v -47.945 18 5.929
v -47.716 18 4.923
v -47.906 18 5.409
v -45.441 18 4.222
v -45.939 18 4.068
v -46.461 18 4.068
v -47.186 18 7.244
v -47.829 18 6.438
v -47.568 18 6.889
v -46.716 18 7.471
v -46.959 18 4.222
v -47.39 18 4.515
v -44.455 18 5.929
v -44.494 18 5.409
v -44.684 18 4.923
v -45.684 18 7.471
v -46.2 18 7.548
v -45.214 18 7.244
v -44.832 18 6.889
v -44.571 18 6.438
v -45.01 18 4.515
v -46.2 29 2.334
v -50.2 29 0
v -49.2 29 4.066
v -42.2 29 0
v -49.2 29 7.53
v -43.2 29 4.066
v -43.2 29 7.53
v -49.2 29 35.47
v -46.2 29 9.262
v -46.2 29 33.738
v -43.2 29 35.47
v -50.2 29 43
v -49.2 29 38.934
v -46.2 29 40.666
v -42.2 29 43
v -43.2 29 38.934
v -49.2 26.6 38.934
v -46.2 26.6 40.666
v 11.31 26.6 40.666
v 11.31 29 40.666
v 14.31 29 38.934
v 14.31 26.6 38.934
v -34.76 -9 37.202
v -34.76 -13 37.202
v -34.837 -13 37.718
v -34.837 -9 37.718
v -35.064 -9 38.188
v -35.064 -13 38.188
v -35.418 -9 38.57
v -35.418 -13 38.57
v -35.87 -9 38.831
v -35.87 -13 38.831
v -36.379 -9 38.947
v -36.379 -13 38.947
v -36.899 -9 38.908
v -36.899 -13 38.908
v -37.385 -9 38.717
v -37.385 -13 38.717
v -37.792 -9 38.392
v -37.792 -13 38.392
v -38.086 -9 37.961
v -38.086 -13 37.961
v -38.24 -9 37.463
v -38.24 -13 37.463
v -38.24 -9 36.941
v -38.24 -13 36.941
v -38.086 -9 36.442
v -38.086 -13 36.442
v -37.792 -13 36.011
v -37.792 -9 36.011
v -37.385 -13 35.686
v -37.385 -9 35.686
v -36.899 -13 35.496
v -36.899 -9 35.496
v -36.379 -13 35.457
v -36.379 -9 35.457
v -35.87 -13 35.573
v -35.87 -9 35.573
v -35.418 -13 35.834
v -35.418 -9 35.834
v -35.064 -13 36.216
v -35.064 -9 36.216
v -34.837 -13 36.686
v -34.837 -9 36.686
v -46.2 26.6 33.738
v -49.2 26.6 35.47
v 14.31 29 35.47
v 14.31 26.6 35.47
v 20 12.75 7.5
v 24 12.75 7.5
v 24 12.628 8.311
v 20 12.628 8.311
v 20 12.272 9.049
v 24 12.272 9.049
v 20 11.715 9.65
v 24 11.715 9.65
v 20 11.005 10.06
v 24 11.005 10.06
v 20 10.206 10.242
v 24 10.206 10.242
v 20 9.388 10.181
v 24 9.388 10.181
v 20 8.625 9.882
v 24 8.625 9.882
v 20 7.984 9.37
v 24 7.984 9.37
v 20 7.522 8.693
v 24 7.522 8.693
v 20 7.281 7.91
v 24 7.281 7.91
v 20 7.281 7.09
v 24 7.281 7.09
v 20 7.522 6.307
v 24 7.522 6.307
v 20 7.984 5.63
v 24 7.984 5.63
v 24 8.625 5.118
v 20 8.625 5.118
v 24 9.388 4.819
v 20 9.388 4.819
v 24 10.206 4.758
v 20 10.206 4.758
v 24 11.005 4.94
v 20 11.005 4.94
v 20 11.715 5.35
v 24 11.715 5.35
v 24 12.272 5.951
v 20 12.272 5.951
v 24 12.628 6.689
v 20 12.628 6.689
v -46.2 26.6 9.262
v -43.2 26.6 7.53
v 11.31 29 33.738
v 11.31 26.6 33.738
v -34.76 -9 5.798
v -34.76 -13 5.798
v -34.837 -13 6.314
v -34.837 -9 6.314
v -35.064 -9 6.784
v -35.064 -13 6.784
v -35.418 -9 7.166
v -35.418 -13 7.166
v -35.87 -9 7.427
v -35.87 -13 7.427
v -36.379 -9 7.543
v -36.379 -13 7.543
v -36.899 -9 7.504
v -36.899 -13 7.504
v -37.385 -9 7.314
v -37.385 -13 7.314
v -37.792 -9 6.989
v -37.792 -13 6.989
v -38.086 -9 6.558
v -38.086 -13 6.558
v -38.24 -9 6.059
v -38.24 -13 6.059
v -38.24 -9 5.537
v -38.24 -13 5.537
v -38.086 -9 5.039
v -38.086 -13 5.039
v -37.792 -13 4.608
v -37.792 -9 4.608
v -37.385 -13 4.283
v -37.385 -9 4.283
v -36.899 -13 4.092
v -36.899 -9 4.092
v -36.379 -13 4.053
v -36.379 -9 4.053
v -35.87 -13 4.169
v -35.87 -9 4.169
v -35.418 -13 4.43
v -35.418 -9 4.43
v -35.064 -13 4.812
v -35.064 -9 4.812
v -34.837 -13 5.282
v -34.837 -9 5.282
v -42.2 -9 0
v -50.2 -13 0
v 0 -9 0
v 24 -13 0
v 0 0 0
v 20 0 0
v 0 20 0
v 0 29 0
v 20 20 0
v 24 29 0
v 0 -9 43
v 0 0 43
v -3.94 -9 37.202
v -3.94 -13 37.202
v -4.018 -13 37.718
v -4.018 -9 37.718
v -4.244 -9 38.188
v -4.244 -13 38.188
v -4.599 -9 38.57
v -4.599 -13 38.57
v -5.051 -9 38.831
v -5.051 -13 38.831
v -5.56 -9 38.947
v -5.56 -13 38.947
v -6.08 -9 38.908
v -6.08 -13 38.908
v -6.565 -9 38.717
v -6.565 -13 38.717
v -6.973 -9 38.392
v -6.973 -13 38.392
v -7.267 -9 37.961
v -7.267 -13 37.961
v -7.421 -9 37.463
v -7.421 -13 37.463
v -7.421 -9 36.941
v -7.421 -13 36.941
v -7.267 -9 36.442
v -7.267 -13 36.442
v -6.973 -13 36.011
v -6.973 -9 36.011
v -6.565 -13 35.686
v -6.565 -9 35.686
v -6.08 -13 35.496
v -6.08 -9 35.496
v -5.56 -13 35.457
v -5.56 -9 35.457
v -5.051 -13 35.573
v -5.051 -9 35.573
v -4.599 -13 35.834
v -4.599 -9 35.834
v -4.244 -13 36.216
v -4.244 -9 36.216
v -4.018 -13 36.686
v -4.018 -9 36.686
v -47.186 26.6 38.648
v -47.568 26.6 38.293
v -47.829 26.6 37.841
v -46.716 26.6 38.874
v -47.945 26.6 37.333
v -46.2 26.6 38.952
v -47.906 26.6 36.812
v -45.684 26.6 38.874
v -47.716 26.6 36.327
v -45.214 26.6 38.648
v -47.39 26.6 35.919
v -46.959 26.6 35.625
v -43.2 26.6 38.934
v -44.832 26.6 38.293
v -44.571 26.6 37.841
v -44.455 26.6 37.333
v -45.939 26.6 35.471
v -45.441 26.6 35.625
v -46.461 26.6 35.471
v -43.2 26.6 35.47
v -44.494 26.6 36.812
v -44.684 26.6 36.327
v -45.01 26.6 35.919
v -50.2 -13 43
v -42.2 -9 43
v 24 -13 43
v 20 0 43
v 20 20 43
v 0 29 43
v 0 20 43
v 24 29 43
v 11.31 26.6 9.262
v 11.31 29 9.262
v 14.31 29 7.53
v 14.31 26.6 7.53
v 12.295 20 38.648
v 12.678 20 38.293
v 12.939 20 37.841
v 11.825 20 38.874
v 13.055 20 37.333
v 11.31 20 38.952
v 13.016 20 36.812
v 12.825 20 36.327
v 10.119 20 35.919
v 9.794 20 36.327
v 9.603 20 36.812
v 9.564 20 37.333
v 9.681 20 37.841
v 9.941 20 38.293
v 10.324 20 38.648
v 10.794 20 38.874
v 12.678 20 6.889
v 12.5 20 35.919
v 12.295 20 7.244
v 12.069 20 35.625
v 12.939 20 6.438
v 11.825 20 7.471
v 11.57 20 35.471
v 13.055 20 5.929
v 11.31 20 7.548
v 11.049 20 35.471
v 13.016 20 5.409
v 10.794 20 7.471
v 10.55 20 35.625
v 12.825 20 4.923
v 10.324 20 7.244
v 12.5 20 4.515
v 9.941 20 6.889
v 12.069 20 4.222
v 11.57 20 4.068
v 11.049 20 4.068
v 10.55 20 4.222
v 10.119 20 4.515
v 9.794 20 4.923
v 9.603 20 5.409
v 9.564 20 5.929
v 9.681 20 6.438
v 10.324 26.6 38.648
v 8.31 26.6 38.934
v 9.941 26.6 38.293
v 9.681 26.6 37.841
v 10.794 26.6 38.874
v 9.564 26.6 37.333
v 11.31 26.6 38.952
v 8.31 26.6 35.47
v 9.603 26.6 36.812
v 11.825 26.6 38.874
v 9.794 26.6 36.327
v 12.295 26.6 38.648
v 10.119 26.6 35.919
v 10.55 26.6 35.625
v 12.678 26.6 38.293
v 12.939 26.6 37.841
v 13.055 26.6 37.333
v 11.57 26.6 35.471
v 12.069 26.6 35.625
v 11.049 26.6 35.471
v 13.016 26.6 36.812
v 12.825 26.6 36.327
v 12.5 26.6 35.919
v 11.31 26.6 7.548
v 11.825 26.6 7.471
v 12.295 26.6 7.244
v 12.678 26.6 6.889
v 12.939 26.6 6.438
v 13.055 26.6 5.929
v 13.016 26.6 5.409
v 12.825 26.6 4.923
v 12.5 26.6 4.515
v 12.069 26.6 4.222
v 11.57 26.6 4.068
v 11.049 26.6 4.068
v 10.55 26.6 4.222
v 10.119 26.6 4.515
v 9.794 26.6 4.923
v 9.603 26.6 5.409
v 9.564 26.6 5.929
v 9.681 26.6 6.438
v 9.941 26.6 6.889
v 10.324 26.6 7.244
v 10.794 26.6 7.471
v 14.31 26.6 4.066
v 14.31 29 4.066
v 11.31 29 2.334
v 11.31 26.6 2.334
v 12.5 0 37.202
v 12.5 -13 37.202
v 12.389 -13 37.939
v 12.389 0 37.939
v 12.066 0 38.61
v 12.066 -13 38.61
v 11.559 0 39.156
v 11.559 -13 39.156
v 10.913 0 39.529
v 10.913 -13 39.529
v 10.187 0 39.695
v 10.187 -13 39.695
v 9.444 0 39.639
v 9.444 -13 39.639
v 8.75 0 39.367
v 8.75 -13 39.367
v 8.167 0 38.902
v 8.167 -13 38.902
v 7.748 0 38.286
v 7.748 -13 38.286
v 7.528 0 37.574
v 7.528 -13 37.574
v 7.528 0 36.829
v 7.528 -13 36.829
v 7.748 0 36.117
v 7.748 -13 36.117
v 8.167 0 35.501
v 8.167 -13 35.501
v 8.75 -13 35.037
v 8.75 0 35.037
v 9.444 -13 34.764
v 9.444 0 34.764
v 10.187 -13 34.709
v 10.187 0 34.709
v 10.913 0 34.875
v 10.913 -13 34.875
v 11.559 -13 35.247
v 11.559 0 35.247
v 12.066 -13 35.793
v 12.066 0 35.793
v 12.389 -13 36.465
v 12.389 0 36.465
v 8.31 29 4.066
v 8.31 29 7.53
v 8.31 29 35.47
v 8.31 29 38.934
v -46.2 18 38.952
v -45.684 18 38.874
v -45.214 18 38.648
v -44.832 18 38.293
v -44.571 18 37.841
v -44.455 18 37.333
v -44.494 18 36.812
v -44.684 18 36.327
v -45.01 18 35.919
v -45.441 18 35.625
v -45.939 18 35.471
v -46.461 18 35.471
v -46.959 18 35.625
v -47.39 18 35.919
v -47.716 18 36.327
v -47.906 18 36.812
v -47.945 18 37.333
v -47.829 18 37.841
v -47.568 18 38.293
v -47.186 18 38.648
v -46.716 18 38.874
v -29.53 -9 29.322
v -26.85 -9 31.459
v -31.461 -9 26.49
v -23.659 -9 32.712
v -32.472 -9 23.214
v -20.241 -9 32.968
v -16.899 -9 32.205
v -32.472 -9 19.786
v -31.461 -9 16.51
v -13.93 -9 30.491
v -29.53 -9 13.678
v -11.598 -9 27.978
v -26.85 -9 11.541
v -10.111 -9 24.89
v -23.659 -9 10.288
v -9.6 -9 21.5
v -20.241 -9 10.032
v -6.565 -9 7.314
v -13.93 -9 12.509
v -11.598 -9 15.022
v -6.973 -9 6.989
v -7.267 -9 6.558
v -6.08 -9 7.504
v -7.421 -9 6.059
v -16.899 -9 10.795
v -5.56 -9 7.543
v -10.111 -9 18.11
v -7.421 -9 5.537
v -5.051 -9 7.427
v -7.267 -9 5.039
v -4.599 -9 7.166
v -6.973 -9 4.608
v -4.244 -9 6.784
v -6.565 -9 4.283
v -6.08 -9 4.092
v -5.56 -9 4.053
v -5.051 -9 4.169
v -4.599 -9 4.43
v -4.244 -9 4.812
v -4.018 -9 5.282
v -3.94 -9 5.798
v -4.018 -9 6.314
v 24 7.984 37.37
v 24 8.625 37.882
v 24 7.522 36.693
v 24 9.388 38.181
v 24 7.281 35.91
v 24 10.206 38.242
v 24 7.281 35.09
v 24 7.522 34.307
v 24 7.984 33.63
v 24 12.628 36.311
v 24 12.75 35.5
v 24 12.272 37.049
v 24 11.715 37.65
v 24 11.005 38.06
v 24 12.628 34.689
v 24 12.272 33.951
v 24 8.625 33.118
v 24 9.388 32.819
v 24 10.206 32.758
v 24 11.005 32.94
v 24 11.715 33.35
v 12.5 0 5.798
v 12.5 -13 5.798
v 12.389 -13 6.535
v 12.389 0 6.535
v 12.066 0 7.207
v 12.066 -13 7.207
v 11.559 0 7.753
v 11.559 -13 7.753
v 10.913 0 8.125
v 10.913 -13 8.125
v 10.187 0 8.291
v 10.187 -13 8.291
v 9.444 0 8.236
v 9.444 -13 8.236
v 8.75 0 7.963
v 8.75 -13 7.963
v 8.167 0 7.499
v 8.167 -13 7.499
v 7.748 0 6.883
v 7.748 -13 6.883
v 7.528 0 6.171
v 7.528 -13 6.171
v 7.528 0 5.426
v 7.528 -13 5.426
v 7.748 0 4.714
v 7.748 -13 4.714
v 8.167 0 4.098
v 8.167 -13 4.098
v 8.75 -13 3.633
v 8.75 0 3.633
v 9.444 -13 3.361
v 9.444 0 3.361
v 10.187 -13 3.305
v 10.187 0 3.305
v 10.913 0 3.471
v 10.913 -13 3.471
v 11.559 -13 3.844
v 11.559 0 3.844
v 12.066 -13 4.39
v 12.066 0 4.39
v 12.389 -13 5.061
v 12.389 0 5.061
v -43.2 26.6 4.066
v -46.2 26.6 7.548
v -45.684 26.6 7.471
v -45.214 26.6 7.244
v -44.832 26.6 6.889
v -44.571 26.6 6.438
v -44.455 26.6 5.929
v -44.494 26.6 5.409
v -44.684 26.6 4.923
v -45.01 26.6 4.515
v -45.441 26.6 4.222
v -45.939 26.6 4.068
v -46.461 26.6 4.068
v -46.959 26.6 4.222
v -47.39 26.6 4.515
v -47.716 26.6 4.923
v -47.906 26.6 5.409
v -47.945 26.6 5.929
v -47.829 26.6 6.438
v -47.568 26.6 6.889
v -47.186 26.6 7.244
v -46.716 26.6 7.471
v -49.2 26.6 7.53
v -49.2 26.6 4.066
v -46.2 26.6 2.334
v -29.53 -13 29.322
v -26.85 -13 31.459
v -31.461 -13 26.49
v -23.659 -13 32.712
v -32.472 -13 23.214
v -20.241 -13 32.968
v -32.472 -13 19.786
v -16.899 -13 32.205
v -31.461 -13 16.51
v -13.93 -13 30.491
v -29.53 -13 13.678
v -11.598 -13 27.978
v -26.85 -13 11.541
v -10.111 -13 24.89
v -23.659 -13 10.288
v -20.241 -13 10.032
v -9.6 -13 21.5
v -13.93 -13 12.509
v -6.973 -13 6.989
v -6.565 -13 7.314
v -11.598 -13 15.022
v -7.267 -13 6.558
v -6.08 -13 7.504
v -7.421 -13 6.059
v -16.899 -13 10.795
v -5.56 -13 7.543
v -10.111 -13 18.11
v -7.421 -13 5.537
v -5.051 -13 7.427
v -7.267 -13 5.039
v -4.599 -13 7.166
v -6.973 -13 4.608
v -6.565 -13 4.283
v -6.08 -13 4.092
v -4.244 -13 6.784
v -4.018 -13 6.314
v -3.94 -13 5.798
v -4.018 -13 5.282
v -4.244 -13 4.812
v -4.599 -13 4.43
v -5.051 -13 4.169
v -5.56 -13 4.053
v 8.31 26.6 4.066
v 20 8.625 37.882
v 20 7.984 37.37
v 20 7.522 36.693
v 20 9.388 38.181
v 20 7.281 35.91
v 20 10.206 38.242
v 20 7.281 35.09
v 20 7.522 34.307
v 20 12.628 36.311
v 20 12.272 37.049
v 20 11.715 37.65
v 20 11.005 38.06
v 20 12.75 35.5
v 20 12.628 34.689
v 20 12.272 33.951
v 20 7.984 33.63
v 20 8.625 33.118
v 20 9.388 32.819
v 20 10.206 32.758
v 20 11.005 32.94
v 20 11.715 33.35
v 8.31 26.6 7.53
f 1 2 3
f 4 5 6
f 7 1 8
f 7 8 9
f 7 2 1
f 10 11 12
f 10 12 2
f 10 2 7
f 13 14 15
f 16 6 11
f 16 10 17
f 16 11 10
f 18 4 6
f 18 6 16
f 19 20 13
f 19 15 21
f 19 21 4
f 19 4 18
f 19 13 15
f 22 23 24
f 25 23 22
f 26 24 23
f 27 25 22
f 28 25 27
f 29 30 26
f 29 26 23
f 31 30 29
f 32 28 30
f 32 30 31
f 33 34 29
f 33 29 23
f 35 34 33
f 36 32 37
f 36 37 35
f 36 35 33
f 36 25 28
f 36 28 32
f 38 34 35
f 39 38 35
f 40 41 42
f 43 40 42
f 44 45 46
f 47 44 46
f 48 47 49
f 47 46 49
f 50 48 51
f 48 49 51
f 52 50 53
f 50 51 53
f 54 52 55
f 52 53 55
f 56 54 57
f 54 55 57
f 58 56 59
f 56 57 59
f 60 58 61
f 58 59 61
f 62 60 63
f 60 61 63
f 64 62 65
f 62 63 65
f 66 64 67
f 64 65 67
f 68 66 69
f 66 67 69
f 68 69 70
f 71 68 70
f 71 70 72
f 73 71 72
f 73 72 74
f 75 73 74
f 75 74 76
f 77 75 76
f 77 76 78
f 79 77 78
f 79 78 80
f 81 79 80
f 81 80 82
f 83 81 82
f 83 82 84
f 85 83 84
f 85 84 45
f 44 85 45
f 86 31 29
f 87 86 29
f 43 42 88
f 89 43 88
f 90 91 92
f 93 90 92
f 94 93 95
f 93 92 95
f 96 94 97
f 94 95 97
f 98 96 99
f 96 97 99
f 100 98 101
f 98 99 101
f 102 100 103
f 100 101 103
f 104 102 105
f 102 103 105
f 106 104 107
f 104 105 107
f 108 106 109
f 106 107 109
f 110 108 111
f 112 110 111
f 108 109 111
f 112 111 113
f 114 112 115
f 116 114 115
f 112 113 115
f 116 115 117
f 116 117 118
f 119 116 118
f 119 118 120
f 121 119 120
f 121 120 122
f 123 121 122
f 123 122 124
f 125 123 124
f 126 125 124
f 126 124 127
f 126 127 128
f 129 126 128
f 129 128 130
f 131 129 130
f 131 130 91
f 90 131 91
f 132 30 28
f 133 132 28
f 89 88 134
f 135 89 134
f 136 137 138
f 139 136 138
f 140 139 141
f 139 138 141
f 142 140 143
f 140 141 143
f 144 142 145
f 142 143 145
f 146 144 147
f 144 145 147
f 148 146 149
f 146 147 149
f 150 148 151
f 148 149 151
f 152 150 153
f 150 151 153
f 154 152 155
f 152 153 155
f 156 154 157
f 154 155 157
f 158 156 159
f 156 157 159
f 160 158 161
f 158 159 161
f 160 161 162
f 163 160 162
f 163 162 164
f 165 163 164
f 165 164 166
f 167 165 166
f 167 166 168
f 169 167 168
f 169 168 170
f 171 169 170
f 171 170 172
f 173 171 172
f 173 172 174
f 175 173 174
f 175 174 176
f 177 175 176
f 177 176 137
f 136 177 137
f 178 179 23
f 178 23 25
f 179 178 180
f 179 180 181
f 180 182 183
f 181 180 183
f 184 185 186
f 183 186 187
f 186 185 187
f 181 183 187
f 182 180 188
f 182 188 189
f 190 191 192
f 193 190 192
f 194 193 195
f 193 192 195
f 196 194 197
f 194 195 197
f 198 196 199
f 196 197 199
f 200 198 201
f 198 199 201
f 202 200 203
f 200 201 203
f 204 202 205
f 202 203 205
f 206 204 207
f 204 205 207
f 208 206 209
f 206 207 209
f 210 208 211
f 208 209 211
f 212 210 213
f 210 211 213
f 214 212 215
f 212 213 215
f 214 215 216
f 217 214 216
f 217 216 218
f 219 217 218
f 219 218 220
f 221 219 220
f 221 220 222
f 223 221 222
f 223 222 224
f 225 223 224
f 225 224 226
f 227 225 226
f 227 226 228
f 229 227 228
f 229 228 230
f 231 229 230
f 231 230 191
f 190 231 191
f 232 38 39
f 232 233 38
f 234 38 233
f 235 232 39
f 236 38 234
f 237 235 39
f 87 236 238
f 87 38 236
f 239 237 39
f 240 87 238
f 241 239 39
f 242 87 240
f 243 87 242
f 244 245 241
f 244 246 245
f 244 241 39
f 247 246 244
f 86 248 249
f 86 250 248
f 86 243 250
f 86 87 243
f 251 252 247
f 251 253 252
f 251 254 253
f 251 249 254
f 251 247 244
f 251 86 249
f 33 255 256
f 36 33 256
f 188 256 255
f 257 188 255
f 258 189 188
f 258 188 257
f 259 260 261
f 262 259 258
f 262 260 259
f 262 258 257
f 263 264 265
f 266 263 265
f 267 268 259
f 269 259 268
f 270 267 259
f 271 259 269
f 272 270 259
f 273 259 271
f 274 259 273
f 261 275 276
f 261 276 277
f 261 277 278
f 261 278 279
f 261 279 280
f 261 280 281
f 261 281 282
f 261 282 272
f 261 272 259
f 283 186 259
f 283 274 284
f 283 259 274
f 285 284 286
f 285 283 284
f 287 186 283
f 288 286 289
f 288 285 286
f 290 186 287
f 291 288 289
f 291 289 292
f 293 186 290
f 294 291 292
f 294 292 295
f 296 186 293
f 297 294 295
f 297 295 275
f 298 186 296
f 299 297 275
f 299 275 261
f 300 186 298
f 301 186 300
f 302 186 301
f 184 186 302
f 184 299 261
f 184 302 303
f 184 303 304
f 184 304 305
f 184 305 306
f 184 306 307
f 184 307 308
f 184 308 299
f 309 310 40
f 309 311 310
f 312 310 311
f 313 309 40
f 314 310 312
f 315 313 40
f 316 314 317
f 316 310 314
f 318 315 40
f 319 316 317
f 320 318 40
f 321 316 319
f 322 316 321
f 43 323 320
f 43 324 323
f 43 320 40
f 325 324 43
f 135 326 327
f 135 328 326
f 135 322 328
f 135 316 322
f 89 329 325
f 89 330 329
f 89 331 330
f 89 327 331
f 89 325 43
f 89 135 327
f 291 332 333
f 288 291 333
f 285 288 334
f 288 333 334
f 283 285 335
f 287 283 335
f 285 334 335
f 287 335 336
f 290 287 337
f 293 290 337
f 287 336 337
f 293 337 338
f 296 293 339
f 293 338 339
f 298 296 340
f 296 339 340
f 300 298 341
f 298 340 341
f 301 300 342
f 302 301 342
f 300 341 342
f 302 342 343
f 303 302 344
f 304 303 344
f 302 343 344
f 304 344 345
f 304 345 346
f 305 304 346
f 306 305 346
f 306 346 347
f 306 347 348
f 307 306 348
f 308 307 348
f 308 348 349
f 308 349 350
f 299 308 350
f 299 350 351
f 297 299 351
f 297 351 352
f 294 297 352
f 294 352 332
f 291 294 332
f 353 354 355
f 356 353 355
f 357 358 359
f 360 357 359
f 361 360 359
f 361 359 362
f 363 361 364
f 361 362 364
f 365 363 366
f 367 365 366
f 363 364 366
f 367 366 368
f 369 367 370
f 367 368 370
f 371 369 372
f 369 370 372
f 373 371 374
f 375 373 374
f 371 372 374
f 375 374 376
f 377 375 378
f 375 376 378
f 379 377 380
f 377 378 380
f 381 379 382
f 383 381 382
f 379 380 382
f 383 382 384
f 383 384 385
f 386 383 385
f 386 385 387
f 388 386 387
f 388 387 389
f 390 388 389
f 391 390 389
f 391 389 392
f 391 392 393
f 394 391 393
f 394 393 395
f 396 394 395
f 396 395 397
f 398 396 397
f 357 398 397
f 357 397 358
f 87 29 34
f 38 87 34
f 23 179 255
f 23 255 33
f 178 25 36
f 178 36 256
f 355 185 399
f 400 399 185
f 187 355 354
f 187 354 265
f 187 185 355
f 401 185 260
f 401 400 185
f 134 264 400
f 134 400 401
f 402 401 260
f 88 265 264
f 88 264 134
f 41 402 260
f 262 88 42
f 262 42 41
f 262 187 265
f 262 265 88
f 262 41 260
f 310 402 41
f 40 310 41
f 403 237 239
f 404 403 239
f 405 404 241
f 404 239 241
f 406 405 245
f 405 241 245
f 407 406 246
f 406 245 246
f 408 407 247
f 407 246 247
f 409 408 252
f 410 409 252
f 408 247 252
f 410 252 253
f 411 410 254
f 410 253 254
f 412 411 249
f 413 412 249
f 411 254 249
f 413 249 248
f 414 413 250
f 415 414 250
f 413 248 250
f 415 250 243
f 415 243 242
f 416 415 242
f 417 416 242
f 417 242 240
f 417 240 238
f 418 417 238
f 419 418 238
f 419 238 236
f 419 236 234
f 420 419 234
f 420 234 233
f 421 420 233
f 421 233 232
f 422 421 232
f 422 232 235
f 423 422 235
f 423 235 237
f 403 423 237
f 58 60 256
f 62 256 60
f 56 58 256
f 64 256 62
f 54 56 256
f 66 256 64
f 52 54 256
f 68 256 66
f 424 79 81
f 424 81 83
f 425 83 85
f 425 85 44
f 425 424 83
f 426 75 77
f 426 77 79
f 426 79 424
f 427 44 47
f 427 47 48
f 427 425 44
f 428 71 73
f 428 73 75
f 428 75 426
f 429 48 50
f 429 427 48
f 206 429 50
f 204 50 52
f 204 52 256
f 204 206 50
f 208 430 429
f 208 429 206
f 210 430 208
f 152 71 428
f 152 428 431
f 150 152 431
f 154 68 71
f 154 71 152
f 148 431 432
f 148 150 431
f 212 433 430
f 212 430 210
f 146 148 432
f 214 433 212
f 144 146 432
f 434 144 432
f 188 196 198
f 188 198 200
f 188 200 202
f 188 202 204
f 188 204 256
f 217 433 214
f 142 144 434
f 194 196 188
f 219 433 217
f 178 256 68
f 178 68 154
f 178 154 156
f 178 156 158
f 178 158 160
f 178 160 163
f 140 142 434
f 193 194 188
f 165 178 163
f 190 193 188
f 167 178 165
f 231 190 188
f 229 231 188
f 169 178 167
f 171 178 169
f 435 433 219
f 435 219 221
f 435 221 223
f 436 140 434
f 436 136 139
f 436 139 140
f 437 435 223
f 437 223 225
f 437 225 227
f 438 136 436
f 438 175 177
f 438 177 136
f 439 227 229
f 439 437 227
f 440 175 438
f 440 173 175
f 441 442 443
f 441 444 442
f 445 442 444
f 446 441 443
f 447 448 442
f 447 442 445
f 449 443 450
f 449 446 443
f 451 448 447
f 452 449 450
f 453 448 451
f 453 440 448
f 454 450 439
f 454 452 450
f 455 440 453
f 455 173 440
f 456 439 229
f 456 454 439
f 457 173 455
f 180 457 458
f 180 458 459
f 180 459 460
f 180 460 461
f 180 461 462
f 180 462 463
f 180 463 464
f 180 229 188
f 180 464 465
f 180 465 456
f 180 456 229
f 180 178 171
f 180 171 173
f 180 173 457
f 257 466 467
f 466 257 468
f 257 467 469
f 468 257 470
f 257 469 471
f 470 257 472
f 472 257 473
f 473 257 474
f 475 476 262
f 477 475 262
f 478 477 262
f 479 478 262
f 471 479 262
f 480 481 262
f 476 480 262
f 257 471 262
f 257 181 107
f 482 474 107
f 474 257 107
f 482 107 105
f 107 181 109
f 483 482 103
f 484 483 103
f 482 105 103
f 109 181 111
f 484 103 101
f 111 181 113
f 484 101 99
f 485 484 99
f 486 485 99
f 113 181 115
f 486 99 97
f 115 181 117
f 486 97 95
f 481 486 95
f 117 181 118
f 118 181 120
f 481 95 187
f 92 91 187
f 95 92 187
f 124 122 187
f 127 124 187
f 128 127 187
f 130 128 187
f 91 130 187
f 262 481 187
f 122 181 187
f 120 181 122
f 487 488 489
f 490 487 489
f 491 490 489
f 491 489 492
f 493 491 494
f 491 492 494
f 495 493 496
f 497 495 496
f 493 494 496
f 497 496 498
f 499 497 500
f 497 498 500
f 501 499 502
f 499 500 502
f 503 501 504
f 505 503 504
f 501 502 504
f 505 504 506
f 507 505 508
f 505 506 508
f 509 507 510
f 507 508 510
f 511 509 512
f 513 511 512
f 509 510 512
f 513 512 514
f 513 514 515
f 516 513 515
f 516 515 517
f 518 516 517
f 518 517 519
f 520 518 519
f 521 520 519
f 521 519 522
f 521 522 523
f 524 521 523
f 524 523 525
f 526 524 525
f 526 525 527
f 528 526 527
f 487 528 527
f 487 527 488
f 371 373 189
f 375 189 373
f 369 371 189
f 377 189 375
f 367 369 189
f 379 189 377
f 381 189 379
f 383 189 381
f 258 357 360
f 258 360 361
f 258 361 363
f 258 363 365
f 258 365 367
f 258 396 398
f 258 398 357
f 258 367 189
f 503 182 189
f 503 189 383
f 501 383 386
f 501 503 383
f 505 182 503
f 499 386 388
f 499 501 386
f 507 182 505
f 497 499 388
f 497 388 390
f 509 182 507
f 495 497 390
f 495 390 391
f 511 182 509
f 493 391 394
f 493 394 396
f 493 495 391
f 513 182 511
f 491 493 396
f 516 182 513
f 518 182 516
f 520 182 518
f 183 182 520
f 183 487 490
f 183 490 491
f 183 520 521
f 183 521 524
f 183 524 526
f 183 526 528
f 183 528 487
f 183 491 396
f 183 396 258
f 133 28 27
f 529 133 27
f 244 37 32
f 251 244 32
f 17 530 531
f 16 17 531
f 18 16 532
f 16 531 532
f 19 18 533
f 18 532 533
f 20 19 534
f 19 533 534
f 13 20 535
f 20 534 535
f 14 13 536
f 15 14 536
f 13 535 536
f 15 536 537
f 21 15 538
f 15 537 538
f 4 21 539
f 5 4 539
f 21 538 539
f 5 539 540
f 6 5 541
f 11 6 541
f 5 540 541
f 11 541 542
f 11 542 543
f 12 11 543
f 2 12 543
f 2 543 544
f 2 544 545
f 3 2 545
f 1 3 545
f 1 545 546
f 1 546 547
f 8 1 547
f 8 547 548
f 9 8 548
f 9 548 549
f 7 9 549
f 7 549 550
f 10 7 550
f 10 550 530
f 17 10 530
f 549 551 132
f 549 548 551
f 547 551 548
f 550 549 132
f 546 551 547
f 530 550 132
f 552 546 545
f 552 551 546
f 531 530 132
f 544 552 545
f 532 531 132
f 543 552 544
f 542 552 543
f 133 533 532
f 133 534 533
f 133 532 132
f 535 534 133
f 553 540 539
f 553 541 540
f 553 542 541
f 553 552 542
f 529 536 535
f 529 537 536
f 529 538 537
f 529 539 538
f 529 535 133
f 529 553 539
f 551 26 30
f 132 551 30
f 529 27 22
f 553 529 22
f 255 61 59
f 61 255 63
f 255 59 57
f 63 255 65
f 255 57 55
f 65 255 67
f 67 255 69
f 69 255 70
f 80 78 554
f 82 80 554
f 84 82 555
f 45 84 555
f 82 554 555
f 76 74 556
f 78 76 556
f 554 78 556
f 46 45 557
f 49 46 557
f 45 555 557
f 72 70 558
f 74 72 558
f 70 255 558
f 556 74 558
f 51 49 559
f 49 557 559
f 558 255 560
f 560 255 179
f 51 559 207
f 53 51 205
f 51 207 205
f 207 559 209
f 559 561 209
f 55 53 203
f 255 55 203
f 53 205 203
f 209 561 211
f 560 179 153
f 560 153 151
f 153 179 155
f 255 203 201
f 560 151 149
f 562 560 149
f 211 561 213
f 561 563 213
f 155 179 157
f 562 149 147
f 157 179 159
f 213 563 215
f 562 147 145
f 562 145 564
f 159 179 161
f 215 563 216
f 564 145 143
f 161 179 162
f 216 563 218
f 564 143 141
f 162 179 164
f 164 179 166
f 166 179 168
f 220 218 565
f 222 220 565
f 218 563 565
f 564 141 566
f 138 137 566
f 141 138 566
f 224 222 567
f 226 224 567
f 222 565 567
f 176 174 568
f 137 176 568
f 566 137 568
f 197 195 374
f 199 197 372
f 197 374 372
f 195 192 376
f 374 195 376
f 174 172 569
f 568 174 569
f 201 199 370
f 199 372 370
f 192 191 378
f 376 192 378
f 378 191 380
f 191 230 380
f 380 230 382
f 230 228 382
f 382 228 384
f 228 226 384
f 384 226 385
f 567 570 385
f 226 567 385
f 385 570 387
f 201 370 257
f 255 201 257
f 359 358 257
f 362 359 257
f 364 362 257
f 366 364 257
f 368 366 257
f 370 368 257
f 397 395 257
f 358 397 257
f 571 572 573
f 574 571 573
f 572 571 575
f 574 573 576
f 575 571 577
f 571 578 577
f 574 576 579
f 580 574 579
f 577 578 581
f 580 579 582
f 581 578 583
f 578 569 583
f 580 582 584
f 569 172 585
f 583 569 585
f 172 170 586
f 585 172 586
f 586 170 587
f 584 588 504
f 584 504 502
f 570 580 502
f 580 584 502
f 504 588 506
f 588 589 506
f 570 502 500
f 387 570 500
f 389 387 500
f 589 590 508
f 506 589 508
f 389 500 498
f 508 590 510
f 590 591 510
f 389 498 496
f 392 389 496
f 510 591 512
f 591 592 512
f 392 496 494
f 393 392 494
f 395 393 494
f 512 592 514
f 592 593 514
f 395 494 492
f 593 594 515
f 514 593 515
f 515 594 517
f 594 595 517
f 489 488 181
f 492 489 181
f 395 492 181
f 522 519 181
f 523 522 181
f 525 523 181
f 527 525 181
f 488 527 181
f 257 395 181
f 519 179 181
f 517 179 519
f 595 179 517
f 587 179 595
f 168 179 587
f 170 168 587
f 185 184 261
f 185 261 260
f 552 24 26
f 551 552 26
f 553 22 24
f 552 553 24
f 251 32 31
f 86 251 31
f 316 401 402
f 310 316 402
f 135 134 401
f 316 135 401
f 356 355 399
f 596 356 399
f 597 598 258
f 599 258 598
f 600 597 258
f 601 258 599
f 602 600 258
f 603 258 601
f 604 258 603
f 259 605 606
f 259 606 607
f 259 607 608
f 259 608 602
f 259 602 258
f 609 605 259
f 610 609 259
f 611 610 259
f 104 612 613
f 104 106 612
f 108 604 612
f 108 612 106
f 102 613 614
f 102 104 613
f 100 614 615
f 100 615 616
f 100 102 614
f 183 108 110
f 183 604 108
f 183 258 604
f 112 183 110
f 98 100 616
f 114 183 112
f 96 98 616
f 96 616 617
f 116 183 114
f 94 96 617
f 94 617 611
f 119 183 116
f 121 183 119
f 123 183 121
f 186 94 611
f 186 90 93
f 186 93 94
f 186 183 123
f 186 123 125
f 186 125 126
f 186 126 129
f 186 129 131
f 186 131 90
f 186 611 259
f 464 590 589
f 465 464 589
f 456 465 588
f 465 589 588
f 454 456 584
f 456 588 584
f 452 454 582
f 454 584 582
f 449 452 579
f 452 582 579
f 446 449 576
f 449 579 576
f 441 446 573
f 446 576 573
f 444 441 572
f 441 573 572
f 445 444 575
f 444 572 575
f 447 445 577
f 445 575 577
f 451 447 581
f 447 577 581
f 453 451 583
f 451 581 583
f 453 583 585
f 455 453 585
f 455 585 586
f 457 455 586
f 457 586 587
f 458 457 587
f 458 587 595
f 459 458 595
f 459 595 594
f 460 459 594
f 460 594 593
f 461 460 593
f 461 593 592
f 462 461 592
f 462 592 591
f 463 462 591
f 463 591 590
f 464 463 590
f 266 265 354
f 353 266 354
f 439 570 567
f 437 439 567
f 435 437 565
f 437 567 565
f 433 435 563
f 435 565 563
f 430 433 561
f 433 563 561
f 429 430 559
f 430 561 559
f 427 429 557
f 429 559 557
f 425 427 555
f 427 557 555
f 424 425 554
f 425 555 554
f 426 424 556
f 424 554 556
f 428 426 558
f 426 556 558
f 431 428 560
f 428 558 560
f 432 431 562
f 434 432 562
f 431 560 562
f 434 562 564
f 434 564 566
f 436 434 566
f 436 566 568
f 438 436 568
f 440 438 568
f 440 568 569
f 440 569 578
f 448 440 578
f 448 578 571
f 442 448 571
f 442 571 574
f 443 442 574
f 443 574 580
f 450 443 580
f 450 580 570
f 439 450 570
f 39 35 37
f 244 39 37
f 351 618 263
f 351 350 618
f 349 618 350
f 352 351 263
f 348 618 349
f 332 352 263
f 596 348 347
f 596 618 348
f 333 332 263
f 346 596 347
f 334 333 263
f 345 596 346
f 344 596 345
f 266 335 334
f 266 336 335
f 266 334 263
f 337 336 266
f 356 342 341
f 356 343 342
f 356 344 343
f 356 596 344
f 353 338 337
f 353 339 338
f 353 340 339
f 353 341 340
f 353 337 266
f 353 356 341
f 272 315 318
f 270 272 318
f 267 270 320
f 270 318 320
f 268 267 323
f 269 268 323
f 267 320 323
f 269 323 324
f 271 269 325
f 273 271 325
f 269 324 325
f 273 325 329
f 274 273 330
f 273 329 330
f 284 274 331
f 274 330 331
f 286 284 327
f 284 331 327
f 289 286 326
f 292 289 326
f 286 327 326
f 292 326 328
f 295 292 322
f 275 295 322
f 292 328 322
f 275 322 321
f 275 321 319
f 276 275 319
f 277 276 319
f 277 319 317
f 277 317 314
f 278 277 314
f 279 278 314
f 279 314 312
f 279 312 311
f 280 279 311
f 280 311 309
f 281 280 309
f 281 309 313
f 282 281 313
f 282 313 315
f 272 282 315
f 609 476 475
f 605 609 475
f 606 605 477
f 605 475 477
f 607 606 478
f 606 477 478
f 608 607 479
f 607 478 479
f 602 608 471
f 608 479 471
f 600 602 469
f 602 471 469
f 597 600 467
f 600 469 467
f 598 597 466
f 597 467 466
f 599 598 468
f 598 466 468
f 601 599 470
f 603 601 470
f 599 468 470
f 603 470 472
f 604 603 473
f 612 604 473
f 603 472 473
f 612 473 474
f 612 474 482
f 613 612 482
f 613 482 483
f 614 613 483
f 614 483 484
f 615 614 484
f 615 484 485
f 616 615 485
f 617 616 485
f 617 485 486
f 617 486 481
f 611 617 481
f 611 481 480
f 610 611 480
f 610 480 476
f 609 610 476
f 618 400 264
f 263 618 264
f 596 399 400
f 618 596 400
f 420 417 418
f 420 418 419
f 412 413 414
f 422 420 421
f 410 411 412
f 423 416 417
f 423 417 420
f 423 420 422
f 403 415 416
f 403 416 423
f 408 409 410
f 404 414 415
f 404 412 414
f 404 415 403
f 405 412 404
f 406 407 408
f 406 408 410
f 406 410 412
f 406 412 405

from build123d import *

# Parameters (mm, degrees)
SKETCH1_W           = 74.2
SKETCH1_H           = 46
BOSS_EXTRUDE1_DEPTH = 43
SKETCH2_R           = 11.5
SKETCH2_R_2         = 1.75
SKETCH2_R_3         = 2.5
CUT_EXTRUDE1_DEPTH  = 20
SKETCH3_R           = 3.1
SKETCH3_R_2         = 1.75
CUT_EXTRUDE2_DEPTH  = 15
CUT_EXTRUDE3_DEPTH  = 2.4
SKETCH5_R           = 2.75
CUT_EXTRUDE4_DEPTH  = 12.4


with BuildPart() as part:
    # Sketch1 → Boss-Extrude1 (new body)
    with BuildSketch(Plane.XY):
        with Locations((-13.1, 10)):
            Rectangle(SKETCH1_W, SKETCH1_H)
        Polygon((0, 0), (20, 0), (20, 20), (0, 20), (0, 29), (-42.2, 29), (-42.2, -9), (0, -9), align=None, mode=Mode.SUBTRACT)
    extrude(amount=BOSS_EXTRUDE1_DEPTH)

    # Sketch2 → Cut-Extrude1 (cut)
    with BuildSketch(Plane.XZ.offset(13)):
        with Locations((-21.1, 21.5)):
            Circle(SKETCH2_R)
        with Locations((-36.509600894, 37.201726029)):
            Circle(SKETCH2_R_2)
        with Locations((-5.690399106, 5.798273971)):
            Circle(SKETCH2_R_2)
        with Locations((-36.509600894, 5.798273971)):
            Circle(SKETCH2_R_2)
        with Locations((-5.690399106, 37.201726029)):
            Circle(SKETCH2_R_2)
        with Locations((10, 37.201726029)):
            Circle(SKETCH2_R_3)
        with Locations((10, 5.798273971)):
            Circle(SKETCH2_R_3)
    extrude(amount=-CUT_EXTRUDE1_DEPTH, mode=Mode.SUBTRACT)

    # Sketch3 → Cut-Extrude2 (cut)
    with BuildSketch(Plane(origin=(0, 33, 0), x_dir=(1, 0, 0), z_dir=(0, 1, 0))):
        with Locations(Location((-36.509600894, -5.798273971, 0), (0, 0, 270))):
            Circle(SKETCH3_R)
        with Locations(Location((-5.690399106, -5.798273971, 0), (0, 0, 270))):
            Circle(SKETCH3_R)
        with Locations(Location((-5.690399106, -37.201726029, 0), (0, 0, 270))):
            Circle(SKETCH3_R)
        with Locations(Location((-36.509600894, -37.201726029, 0), (0, 0, 270))):
            Circle(SKETCH3_R)
        with Locations(Location((-46.2, -5.798273971, 0), (0, 0, 270))):
            Circle(SKETCH3_R_2)
        with Locations(Location((-46.2, -37.201726029, 0), (0, 0, 270))):
            Circle(SKETCH3_R_2)
        with Locations(Location((11.309600894, -5.798273971, 0), (0, 0, 270))):
            Circle(SKETCH3_R_2)
        with Locations(Location((11.309600894, -37.201726029, 0), (0, 0, 270))):
            Circle(SKETCH3_R_2)
    extrude(amount=-CUT_EXTRUDE2_DEPTH, mode=Mode.SUBTRACT)


with BuildPart() as body_2:
    # Split1: the piece on the far side of the plane
    add(part.part)
    split(bisect_by=Plane.ZX.offset(29), keep=Keep.BOTTOM)

    # Sketch4 → Cut-Extrude3 (cut)
    with BuildSketch(Plane(origin=(0, 29, 0), x_dir=(1, 0, 0), z_dir=(0, 1, 0))):
        Polygon((-46.2, -2.334172356), (-49.2, -4.066223163), (-49.2, -7.530324778), (-46.2, -9.262375586), (-43.2, -7.530324778), (-43.2, -4.066223163), align=None)
        Polygon((-43.2, -35.469675222), (-46.2, -33.737624414), (-49.2, -35.469675222), (-49.2, -38.933776837), (-46.2, -40.665827644), (-43.2, -38.933776837), align=None)
        Polygon((14.309600894, -4.066223163), (11.309600894, -2.334172356), (8.309600894, -4.066223163), (8.309600894, -7.530324778), (11.309600894, -9.262375586), (14.309600894, -7.530324778), align=None)
        Polygon((14.309600894, -35.469675222), (11.309600894, -33.737624414), (8.309600894, -35.469675222), (8.309600894, -38.933776837), (11.309600894, -40.665827644), (14.309600894, -38.933776837), align=None)
    extrude(amount=-CUT_EXTRUDE3_DEPTH, mode=Mode.SUBTRACT)

    # Sketch5 → Cut-Extrude4 (cut)
    with BuildSketch(Plane(origin=(24, 0, 0), x_dir=(0, 0, -1), z_dir=(1, 0, 0))):
        with Locations(Location((-35.5, 10, 0), (0, 0, 90))):
            Circle(SKETCH5_R)
        with Locations(Location((-7.5, 10, 0), (0, 0, 90))):
            Circle(SKETCH5_R)
    extrude(amount=-CUT_EXTRUDE4_DEPTH, mode=Mode.SUBTRACT)


with BuildPart() as part_1:
    add(part.part)

    # Split1
    split(bisect_by=Plane.ZX.offset(29), keep=Keep.TOP)


solid = body_2.part
